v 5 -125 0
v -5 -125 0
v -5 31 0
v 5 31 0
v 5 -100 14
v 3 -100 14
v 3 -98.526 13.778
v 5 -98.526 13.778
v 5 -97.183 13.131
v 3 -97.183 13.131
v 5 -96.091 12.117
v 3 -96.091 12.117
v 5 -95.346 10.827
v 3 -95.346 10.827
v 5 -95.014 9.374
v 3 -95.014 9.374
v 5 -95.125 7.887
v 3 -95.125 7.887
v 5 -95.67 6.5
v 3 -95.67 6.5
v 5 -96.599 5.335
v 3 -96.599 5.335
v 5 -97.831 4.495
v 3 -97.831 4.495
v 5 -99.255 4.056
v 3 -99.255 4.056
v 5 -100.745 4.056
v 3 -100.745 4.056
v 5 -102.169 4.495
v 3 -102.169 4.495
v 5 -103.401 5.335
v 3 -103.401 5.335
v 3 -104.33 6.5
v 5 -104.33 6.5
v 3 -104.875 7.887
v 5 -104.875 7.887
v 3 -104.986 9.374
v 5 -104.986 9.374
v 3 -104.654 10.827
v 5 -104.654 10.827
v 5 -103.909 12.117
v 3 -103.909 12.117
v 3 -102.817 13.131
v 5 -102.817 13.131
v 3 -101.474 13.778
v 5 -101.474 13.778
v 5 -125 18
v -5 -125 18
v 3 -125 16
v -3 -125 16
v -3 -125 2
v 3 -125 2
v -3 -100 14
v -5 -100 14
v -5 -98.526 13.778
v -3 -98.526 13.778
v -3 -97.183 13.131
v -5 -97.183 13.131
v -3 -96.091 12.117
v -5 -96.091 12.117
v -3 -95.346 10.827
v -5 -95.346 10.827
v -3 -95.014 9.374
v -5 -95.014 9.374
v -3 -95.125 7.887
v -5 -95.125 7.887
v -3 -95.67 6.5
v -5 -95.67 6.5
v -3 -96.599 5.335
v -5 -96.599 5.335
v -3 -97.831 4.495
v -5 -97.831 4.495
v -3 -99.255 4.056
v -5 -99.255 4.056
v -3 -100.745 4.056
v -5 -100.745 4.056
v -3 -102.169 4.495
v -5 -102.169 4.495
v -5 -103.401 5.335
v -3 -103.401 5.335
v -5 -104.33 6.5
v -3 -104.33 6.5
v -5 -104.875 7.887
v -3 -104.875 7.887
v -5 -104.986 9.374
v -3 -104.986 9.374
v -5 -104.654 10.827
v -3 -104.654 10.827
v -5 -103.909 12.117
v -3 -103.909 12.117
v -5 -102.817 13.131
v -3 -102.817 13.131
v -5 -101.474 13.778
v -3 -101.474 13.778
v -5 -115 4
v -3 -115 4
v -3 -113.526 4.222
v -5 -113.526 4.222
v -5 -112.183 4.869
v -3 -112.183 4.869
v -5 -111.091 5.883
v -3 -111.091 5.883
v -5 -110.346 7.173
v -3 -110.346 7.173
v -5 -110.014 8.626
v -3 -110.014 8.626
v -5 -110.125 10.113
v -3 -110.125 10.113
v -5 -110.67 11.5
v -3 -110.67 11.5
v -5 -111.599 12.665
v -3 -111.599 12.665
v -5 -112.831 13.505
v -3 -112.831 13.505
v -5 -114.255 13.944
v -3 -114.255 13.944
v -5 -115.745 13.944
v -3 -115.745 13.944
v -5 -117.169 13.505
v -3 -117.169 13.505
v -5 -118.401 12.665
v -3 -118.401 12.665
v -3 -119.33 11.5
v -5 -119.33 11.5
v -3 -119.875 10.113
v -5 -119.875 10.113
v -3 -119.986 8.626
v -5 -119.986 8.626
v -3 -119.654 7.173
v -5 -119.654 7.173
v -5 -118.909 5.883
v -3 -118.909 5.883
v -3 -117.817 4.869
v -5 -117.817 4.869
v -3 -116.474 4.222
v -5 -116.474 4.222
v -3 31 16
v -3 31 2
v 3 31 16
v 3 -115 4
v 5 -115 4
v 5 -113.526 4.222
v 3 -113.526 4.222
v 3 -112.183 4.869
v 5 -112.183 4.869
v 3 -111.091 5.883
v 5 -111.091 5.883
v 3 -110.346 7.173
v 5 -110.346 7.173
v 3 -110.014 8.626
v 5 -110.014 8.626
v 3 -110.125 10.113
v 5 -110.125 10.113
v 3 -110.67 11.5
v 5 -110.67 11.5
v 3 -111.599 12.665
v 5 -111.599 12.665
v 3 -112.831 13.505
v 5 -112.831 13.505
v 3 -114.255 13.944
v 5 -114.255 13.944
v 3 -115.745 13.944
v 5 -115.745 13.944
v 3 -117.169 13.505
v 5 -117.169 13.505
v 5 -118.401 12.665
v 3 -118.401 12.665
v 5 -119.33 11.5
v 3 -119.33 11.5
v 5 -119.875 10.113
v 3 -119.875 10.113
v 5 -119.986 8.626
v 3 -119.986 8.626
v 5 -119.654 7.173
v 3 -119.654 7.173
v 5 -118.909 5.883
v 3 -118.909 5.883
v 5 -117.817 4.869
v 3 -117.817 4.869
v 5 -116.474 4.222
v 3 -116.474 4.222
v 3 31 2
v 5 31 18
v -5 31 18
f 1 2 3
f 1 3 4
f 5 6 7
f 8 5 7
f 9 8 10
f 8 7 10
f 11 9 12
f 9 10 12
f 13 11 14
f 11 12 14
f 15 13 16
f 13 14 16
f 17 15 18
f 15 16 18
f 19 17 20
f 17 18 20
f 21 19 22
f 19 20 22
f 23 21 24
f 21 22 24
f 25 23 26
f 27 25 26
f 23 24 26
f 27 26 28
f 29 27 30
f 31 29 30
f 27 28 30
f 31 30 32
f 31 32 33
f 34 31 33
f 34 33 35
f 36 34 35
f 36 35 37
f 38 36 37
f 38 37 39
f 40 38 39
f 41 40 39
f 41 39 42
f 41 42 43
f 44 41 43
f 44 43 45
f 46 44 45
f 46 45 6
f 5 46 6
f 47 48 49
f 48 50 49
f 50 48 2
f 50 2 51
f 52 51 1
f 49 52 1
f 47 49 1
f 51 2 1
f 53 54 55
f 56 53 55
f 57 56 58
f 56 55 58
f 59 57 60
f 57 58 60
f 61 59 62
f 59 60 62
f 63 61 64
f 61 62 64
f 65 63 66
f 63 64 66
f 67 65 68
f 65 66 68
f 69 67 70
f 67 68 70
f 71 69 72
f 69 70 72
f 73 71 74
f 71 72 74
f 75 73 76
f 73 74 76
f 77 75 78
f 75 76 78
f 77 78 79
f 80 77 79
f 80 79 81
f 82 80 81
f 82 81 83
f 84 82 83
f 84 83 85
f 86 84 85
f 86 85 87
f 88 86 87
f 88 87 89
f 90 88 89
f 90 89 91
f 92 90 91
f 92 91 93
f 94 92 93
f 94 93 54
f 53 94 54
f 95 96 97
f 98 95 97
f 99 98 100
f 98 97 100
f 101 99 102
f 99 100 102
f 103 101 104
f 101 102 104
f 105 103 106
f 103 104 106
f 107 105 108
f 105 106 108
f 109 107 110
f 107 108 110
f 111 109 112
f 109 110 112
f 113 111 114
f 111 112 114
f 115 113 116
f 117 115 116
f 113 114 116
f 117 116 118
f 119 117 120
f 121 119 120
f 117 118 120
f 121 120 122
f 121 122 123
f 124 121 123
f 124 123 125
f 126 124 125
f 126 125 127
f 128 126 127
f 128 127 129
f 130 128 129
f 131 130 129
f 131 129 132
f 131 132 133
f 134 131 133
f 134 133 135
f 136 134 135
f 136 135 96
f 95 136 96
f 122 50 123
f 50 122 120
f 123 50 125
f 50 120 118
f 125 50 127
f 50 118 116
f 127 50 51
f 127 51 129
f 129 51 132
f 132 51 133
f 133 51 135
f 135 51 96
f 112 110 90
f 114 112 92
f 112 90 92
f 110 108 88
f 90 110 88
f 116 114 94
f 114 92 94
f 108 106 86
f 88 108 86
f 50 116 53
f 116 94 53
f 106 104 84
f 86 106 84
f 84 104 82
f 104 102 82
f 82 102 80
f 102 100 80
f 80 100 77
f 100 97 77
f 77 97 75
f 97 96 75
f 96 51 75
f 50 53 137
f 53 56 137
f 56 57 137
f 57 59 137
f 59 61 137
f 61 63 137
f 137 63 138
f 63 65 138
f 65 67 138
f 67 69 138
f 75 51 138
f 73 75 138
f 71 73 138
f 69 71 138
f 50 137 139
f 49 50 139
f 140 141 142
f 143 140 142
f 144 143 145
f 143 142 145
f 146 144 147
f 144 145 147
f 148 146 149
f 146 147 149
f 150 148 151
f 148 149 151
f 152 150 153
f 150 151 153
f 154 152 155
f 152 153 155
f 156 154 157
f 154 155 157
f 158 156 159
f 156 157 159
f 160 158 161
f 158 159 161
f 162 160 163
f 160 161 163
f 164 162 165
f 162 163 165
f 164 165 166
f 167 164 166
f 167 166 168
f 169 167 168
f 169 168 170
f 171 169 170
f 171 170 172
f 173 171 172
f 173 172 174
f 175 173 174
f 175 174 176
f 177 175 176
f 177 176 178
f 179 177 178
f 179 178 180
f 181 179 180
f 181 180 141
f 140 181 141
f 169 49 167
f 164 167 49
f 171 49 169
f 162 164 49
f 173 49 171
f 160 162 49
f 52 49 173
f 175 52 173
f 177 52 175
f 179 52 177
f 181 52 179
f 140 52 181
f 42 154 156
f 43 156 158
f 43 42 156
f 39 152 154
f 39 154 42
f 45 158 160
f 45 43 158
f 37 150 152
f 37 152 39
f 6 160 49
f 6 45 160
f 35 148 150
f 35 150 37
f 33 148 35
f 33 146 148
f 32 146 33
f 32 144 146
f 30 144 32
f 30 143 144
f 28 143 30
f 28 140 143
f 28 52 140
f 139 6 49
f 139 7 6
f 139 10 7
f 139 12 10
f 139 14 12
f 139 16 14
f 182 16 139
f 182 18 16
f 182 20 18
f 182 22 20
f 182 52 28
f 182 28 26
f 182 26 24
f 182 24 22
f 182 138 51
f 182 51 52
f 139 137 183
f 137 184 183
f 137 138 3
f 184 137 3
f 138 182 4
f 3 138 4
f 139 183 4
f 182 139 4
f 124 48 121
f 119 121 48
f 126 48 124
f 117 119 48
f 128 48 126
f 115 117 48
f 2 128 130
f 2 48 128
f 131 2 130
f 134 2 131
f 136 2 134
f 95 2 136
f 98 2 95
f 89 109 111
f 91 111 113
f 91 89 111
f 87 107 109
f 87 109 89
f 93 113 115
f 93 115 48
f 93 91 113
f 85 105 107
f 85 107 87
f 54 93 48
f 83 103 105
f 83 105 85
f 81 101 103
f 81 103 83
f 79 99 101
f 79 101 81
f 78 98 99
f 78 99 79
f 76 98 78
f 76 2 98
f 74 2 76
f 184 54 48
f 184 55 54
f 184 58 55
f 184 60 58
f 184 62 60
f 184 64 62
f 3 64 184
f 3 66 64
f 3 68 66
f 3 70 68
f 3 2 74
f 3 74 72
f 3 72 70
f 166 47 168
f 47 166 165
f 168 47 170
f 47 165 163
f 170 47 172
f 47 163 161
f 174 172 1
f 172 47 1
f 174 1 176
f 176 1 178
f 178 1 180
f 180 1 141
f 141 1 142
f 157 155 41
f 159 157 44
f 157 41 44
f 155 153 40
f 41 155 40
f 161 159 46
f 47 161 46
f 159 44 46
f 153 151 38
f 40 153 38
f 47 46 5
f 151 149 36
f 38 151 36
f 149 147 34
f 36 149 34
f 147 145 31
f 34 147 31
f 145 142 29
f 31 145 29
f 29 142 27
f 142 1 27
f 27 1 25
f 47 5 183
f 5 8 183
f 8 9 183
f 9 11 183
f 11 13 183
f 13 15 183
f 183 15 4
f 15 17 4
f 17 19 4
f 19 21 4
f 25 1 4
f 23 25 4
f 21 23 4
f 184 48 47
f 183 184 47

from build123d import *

# Parameters (mm, degrees)
SKETCH1_W           = 10
SKETCH1_H           = 250
BOSS_EXTRUDE1_DEPTH = 18
SHELL1_T            = -2
SKETCH3_R           = 5
CUT_EXTRUDE2_DEPTH  = 10
SKETCH4_R           = 5
CUT_EXTRUDE3_DEPTH  = 10
SKETCH5_W           = 18
SKETCH5_H           = 94
CUT_EXTRUDE4_DEPTH  = 10


with BuildPart() as part:
    # Sketch1 → Boss-Extrude1 (new body)
    with BuildSketch(Plane.XY):
        Rectangle(SKETCH1_W, SKETCH1_H)
    extrude(amount=BOSS_EXTRUDE1_DEPTH)

    # Shell1
    shell1_openings = [part.faces().sort_by_distance(p)[0] for p in [
        (0, 125, 9),
        (0, -125, 9),
    ]]
    offset(amount=SHELL1_T, openings=shell1_openings, kind=Kind.INTERSECTION)

    # Sketch3 → Cut-Extrude2 (cut)
    with BuildSketch(Plane.ZY.offset(5)):
        with Locations((9, -100)):
            Circle(SKETCH3_R)
    extrude(amount=-CUT_EXTRUDE2_DEPTH, mode=Mode.SUBTRACT)

    # Sketch4 → Cut-Extrude3 (cut)
    with BuildSketch(Plane(origin=(5, 0, 0), x_dir=(0, 0, -1), z_dir=(1, 0, 0))):
        with Locations((-9, -115)):
            Circle(SKETCH4_R)
    extrude(amount=-CUT_EXTRUDE3_DEPTH, mode=Mode.SUBTRACT)

    # Sketch5 → Cut-Extrude4 (cut)
    with BuildSketch(Plane(origin=(5, 0, 0), x_dir=(0, 0, -1), z_dir=(1, 0, 0))):
        with Locations((-9, 78)):
            Rectangle(SKETCH5_W, SKETCH5_H)
    extrude(amount=-CUT_EXTRUDE4_DEPTH, mode=Mode.SUBTRACT)


solid = part.part
